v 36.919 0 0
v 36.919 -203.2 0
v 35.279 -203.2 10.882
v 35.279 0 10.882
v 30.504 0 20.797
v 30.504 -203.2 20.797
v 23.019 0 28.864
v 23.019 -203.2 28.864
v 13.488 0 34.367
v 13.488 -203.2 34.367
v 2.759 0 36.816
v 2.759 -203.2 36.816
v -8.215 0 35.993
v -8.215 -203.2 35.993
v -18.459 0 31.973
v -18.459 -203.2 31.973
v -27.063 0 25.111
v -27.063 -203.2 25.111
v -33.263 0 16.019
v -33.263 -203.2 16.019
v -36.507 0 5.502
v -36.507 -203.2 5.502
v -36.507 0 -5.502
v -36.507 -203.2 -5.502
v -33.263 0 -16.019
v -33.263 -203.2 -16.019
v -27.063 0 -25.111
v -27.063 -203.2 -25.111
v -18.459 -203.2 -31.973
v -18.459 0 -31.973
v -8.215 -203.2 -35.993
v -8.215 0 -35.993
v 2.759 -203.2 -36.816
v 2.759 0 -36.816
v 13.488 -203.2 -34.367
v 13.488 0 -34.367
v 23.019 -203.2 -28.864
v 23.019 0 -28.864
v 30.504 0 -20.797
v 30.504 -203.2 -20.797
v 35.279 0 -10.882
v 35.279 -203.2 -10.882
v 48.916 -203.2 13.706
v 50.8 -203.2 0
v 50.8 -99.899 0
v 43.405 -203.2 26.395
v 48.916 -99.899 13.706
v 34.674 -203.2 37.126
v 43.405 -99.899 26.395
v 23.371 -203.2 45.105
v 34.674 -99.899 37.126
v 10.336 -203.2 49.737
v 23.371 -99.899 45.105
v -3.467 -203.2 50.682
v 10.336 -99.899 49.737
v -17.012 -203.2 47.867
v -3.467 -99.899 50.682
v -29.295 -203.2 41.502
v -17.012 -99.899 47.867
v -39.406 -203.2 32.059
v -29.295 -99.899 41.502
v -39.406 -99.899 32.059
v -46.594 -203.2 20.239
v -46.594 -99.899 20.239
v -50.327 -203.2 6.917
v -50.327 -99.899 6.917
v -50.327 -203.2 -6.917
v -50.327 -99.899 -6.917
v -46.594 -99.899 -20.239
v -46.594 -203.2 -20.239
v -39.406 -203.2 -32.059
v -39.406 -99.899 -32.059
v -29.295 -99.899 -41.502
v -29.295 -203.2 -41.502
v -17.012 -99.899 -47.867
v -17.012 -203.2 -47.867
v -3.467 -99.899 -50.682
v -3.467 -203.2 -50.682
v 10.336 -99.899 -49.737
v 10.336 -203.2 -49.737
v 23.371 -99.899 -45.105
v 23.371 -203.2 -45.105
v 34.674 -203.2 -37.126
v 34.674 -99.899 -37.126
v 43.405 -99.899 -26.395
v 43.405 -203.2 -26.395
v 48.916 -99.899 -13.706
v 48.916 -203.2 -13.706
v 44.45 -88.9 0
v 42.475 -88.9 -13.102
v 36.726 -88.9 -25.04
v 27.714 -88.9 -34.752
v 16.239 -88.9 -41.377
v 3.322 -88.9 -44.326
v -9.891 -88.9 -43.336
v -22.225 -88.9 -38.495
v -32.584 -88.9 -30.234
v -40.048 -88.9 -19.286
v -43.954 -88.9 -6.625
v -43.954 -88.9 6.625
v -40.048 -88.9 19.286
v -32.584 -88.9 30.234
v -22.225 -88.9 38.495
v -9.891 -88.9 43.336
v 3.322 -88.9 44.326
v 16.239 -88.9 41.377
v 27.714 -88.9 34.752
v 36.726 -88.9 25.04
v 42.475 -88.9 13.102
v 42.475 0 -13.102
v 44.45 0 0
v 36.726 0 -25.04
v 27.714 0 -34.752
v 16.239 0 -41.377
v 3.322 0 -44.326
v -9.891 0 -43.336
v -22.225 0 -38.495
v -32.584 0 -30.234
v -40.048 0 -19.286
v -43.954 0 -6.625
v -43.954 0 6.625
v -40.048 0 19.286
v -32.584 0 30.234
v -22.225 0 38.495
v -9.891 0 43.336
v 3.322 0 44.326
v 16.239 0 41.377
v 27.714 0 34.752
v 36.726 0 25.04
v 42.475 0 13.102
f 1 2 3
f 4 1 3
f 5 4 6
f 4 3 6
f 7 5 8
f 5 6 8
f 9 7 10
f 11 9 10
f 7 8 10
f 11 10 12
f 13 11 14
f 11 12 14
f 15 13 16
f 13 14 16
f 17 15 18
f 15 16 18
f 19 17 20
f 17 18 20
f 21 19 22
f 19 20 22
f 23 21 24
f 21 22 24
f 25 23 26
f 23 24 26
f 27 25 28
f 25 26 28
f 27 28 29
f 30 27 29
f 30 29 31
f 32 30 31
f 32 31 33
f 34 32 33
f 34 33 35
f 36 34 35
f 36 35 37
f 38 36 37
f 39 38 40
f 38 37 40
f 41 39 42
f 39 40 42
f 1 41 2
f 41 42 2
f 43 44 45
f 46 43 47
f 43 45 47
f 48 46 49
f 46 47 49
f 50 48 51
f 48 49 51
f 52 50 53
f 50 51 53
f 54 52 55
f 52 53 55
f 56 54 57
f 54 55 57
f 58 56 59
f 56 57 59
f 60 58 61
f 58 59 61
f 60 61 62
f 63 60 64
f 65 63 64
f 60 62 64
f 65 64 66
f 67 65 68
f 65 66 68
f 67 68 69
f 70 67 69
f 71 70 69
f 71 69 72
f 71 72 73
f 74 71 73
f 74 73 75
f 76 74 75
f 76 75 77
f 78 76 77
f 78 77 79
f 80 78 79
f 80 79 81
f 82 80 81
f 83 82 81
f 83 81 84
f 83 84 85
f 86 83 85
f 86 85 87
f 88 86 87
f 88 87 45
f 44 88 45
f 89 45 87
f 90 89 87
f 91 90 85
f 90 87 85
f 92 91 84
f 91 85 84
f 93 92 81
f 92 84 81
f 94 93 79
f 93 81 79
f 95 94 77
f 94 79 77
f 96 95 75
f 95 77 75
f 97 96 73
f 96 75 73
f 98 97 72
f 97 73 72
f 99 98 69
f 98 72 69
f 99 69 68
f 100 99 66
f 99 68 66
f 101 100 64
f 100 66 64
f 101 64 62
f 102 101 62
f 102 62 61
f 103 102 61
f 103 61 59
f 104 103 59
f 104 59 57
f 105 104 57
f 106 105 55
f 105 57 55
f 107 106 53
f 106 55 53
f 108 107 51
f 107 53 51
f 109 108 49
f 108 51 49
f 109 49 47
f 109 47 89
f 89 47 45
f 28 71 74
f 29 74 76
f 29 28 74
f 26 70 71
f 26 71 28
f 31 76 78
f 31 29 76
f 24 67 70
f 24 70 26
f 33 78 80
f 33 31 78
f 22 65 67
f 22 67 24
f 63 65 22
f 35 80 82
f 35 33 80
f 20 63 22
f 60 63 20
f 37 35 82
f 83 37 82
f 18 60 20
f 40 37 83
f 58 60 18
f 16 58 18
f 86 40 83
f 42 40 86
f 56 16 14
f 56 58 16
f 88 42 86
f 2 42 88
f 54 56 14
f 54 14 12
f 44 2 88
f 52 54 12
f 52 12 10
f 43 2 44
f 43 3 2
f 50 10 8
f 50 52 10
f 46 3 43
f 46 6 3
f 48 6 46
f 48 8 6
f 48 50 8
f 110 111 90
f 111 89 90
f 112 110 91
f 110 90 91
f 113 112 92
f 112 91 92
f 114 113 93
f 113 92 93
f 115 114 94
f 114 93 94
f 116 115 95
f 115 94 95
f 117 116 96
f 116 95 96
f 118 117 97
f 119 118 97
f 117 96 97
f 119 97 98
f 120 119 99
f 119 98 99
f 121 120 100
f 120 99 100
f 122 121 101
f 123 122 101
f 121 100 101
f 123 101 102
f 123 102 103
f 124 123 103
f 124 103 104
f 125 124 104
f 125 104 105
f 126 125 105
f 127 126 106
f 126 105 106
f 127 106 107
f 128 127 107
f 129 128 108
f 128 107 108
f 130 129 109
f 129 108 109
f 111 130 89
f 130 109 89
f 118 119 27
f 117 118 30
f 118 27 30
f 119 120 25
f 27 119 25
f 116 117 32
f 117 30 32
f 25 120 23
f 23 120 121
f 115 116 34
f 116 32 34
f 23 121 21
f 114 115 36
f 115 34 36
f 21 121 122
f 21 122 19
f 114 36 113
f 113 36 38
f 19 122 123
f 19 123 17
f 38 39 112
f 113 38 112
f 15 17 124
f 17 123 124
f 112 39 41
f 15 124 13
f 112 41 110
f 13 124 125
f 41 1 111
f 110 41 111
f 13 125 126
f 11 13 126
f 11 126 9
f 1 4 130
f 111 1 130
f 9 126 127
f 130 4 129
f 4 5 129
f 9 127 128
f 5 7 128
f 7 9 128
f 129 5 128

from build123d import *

# Parameters (mm, degrees)
F0_R     = 50.8
F1_DEPTH = 203.2
F4_R     = 36.9189
F5_DEPTH = 203.2


with BuildPart() as f1:
    # F0 (on Front) → F1 (new body)
    with BuildSketch(Plane.XZ):
        Circle(F0_R)
    extrude(amount=F1_DEPTH)

    # F2 (on Top) → F3 (revolve, cut)
    with BuildSketch(Plane.XY):
        Polygon((89.635386, 0), (44.45, 0), (44.45, -88.9), (89.635386, -167.163385), align=None)
    revolve(axis=Axis((0, 0, 0), (0, 1, 0)), mode=Mode.SUBTRACT)

    # F4 (on face) → F5 (cut)
    with BuildSketch(Plane.XZ.offset(203.2)):
        Circle(F4_R)
    extrude(amount=-F5_DEPTH, mode=Mode.SUBTRACT)


solid = f1.part
